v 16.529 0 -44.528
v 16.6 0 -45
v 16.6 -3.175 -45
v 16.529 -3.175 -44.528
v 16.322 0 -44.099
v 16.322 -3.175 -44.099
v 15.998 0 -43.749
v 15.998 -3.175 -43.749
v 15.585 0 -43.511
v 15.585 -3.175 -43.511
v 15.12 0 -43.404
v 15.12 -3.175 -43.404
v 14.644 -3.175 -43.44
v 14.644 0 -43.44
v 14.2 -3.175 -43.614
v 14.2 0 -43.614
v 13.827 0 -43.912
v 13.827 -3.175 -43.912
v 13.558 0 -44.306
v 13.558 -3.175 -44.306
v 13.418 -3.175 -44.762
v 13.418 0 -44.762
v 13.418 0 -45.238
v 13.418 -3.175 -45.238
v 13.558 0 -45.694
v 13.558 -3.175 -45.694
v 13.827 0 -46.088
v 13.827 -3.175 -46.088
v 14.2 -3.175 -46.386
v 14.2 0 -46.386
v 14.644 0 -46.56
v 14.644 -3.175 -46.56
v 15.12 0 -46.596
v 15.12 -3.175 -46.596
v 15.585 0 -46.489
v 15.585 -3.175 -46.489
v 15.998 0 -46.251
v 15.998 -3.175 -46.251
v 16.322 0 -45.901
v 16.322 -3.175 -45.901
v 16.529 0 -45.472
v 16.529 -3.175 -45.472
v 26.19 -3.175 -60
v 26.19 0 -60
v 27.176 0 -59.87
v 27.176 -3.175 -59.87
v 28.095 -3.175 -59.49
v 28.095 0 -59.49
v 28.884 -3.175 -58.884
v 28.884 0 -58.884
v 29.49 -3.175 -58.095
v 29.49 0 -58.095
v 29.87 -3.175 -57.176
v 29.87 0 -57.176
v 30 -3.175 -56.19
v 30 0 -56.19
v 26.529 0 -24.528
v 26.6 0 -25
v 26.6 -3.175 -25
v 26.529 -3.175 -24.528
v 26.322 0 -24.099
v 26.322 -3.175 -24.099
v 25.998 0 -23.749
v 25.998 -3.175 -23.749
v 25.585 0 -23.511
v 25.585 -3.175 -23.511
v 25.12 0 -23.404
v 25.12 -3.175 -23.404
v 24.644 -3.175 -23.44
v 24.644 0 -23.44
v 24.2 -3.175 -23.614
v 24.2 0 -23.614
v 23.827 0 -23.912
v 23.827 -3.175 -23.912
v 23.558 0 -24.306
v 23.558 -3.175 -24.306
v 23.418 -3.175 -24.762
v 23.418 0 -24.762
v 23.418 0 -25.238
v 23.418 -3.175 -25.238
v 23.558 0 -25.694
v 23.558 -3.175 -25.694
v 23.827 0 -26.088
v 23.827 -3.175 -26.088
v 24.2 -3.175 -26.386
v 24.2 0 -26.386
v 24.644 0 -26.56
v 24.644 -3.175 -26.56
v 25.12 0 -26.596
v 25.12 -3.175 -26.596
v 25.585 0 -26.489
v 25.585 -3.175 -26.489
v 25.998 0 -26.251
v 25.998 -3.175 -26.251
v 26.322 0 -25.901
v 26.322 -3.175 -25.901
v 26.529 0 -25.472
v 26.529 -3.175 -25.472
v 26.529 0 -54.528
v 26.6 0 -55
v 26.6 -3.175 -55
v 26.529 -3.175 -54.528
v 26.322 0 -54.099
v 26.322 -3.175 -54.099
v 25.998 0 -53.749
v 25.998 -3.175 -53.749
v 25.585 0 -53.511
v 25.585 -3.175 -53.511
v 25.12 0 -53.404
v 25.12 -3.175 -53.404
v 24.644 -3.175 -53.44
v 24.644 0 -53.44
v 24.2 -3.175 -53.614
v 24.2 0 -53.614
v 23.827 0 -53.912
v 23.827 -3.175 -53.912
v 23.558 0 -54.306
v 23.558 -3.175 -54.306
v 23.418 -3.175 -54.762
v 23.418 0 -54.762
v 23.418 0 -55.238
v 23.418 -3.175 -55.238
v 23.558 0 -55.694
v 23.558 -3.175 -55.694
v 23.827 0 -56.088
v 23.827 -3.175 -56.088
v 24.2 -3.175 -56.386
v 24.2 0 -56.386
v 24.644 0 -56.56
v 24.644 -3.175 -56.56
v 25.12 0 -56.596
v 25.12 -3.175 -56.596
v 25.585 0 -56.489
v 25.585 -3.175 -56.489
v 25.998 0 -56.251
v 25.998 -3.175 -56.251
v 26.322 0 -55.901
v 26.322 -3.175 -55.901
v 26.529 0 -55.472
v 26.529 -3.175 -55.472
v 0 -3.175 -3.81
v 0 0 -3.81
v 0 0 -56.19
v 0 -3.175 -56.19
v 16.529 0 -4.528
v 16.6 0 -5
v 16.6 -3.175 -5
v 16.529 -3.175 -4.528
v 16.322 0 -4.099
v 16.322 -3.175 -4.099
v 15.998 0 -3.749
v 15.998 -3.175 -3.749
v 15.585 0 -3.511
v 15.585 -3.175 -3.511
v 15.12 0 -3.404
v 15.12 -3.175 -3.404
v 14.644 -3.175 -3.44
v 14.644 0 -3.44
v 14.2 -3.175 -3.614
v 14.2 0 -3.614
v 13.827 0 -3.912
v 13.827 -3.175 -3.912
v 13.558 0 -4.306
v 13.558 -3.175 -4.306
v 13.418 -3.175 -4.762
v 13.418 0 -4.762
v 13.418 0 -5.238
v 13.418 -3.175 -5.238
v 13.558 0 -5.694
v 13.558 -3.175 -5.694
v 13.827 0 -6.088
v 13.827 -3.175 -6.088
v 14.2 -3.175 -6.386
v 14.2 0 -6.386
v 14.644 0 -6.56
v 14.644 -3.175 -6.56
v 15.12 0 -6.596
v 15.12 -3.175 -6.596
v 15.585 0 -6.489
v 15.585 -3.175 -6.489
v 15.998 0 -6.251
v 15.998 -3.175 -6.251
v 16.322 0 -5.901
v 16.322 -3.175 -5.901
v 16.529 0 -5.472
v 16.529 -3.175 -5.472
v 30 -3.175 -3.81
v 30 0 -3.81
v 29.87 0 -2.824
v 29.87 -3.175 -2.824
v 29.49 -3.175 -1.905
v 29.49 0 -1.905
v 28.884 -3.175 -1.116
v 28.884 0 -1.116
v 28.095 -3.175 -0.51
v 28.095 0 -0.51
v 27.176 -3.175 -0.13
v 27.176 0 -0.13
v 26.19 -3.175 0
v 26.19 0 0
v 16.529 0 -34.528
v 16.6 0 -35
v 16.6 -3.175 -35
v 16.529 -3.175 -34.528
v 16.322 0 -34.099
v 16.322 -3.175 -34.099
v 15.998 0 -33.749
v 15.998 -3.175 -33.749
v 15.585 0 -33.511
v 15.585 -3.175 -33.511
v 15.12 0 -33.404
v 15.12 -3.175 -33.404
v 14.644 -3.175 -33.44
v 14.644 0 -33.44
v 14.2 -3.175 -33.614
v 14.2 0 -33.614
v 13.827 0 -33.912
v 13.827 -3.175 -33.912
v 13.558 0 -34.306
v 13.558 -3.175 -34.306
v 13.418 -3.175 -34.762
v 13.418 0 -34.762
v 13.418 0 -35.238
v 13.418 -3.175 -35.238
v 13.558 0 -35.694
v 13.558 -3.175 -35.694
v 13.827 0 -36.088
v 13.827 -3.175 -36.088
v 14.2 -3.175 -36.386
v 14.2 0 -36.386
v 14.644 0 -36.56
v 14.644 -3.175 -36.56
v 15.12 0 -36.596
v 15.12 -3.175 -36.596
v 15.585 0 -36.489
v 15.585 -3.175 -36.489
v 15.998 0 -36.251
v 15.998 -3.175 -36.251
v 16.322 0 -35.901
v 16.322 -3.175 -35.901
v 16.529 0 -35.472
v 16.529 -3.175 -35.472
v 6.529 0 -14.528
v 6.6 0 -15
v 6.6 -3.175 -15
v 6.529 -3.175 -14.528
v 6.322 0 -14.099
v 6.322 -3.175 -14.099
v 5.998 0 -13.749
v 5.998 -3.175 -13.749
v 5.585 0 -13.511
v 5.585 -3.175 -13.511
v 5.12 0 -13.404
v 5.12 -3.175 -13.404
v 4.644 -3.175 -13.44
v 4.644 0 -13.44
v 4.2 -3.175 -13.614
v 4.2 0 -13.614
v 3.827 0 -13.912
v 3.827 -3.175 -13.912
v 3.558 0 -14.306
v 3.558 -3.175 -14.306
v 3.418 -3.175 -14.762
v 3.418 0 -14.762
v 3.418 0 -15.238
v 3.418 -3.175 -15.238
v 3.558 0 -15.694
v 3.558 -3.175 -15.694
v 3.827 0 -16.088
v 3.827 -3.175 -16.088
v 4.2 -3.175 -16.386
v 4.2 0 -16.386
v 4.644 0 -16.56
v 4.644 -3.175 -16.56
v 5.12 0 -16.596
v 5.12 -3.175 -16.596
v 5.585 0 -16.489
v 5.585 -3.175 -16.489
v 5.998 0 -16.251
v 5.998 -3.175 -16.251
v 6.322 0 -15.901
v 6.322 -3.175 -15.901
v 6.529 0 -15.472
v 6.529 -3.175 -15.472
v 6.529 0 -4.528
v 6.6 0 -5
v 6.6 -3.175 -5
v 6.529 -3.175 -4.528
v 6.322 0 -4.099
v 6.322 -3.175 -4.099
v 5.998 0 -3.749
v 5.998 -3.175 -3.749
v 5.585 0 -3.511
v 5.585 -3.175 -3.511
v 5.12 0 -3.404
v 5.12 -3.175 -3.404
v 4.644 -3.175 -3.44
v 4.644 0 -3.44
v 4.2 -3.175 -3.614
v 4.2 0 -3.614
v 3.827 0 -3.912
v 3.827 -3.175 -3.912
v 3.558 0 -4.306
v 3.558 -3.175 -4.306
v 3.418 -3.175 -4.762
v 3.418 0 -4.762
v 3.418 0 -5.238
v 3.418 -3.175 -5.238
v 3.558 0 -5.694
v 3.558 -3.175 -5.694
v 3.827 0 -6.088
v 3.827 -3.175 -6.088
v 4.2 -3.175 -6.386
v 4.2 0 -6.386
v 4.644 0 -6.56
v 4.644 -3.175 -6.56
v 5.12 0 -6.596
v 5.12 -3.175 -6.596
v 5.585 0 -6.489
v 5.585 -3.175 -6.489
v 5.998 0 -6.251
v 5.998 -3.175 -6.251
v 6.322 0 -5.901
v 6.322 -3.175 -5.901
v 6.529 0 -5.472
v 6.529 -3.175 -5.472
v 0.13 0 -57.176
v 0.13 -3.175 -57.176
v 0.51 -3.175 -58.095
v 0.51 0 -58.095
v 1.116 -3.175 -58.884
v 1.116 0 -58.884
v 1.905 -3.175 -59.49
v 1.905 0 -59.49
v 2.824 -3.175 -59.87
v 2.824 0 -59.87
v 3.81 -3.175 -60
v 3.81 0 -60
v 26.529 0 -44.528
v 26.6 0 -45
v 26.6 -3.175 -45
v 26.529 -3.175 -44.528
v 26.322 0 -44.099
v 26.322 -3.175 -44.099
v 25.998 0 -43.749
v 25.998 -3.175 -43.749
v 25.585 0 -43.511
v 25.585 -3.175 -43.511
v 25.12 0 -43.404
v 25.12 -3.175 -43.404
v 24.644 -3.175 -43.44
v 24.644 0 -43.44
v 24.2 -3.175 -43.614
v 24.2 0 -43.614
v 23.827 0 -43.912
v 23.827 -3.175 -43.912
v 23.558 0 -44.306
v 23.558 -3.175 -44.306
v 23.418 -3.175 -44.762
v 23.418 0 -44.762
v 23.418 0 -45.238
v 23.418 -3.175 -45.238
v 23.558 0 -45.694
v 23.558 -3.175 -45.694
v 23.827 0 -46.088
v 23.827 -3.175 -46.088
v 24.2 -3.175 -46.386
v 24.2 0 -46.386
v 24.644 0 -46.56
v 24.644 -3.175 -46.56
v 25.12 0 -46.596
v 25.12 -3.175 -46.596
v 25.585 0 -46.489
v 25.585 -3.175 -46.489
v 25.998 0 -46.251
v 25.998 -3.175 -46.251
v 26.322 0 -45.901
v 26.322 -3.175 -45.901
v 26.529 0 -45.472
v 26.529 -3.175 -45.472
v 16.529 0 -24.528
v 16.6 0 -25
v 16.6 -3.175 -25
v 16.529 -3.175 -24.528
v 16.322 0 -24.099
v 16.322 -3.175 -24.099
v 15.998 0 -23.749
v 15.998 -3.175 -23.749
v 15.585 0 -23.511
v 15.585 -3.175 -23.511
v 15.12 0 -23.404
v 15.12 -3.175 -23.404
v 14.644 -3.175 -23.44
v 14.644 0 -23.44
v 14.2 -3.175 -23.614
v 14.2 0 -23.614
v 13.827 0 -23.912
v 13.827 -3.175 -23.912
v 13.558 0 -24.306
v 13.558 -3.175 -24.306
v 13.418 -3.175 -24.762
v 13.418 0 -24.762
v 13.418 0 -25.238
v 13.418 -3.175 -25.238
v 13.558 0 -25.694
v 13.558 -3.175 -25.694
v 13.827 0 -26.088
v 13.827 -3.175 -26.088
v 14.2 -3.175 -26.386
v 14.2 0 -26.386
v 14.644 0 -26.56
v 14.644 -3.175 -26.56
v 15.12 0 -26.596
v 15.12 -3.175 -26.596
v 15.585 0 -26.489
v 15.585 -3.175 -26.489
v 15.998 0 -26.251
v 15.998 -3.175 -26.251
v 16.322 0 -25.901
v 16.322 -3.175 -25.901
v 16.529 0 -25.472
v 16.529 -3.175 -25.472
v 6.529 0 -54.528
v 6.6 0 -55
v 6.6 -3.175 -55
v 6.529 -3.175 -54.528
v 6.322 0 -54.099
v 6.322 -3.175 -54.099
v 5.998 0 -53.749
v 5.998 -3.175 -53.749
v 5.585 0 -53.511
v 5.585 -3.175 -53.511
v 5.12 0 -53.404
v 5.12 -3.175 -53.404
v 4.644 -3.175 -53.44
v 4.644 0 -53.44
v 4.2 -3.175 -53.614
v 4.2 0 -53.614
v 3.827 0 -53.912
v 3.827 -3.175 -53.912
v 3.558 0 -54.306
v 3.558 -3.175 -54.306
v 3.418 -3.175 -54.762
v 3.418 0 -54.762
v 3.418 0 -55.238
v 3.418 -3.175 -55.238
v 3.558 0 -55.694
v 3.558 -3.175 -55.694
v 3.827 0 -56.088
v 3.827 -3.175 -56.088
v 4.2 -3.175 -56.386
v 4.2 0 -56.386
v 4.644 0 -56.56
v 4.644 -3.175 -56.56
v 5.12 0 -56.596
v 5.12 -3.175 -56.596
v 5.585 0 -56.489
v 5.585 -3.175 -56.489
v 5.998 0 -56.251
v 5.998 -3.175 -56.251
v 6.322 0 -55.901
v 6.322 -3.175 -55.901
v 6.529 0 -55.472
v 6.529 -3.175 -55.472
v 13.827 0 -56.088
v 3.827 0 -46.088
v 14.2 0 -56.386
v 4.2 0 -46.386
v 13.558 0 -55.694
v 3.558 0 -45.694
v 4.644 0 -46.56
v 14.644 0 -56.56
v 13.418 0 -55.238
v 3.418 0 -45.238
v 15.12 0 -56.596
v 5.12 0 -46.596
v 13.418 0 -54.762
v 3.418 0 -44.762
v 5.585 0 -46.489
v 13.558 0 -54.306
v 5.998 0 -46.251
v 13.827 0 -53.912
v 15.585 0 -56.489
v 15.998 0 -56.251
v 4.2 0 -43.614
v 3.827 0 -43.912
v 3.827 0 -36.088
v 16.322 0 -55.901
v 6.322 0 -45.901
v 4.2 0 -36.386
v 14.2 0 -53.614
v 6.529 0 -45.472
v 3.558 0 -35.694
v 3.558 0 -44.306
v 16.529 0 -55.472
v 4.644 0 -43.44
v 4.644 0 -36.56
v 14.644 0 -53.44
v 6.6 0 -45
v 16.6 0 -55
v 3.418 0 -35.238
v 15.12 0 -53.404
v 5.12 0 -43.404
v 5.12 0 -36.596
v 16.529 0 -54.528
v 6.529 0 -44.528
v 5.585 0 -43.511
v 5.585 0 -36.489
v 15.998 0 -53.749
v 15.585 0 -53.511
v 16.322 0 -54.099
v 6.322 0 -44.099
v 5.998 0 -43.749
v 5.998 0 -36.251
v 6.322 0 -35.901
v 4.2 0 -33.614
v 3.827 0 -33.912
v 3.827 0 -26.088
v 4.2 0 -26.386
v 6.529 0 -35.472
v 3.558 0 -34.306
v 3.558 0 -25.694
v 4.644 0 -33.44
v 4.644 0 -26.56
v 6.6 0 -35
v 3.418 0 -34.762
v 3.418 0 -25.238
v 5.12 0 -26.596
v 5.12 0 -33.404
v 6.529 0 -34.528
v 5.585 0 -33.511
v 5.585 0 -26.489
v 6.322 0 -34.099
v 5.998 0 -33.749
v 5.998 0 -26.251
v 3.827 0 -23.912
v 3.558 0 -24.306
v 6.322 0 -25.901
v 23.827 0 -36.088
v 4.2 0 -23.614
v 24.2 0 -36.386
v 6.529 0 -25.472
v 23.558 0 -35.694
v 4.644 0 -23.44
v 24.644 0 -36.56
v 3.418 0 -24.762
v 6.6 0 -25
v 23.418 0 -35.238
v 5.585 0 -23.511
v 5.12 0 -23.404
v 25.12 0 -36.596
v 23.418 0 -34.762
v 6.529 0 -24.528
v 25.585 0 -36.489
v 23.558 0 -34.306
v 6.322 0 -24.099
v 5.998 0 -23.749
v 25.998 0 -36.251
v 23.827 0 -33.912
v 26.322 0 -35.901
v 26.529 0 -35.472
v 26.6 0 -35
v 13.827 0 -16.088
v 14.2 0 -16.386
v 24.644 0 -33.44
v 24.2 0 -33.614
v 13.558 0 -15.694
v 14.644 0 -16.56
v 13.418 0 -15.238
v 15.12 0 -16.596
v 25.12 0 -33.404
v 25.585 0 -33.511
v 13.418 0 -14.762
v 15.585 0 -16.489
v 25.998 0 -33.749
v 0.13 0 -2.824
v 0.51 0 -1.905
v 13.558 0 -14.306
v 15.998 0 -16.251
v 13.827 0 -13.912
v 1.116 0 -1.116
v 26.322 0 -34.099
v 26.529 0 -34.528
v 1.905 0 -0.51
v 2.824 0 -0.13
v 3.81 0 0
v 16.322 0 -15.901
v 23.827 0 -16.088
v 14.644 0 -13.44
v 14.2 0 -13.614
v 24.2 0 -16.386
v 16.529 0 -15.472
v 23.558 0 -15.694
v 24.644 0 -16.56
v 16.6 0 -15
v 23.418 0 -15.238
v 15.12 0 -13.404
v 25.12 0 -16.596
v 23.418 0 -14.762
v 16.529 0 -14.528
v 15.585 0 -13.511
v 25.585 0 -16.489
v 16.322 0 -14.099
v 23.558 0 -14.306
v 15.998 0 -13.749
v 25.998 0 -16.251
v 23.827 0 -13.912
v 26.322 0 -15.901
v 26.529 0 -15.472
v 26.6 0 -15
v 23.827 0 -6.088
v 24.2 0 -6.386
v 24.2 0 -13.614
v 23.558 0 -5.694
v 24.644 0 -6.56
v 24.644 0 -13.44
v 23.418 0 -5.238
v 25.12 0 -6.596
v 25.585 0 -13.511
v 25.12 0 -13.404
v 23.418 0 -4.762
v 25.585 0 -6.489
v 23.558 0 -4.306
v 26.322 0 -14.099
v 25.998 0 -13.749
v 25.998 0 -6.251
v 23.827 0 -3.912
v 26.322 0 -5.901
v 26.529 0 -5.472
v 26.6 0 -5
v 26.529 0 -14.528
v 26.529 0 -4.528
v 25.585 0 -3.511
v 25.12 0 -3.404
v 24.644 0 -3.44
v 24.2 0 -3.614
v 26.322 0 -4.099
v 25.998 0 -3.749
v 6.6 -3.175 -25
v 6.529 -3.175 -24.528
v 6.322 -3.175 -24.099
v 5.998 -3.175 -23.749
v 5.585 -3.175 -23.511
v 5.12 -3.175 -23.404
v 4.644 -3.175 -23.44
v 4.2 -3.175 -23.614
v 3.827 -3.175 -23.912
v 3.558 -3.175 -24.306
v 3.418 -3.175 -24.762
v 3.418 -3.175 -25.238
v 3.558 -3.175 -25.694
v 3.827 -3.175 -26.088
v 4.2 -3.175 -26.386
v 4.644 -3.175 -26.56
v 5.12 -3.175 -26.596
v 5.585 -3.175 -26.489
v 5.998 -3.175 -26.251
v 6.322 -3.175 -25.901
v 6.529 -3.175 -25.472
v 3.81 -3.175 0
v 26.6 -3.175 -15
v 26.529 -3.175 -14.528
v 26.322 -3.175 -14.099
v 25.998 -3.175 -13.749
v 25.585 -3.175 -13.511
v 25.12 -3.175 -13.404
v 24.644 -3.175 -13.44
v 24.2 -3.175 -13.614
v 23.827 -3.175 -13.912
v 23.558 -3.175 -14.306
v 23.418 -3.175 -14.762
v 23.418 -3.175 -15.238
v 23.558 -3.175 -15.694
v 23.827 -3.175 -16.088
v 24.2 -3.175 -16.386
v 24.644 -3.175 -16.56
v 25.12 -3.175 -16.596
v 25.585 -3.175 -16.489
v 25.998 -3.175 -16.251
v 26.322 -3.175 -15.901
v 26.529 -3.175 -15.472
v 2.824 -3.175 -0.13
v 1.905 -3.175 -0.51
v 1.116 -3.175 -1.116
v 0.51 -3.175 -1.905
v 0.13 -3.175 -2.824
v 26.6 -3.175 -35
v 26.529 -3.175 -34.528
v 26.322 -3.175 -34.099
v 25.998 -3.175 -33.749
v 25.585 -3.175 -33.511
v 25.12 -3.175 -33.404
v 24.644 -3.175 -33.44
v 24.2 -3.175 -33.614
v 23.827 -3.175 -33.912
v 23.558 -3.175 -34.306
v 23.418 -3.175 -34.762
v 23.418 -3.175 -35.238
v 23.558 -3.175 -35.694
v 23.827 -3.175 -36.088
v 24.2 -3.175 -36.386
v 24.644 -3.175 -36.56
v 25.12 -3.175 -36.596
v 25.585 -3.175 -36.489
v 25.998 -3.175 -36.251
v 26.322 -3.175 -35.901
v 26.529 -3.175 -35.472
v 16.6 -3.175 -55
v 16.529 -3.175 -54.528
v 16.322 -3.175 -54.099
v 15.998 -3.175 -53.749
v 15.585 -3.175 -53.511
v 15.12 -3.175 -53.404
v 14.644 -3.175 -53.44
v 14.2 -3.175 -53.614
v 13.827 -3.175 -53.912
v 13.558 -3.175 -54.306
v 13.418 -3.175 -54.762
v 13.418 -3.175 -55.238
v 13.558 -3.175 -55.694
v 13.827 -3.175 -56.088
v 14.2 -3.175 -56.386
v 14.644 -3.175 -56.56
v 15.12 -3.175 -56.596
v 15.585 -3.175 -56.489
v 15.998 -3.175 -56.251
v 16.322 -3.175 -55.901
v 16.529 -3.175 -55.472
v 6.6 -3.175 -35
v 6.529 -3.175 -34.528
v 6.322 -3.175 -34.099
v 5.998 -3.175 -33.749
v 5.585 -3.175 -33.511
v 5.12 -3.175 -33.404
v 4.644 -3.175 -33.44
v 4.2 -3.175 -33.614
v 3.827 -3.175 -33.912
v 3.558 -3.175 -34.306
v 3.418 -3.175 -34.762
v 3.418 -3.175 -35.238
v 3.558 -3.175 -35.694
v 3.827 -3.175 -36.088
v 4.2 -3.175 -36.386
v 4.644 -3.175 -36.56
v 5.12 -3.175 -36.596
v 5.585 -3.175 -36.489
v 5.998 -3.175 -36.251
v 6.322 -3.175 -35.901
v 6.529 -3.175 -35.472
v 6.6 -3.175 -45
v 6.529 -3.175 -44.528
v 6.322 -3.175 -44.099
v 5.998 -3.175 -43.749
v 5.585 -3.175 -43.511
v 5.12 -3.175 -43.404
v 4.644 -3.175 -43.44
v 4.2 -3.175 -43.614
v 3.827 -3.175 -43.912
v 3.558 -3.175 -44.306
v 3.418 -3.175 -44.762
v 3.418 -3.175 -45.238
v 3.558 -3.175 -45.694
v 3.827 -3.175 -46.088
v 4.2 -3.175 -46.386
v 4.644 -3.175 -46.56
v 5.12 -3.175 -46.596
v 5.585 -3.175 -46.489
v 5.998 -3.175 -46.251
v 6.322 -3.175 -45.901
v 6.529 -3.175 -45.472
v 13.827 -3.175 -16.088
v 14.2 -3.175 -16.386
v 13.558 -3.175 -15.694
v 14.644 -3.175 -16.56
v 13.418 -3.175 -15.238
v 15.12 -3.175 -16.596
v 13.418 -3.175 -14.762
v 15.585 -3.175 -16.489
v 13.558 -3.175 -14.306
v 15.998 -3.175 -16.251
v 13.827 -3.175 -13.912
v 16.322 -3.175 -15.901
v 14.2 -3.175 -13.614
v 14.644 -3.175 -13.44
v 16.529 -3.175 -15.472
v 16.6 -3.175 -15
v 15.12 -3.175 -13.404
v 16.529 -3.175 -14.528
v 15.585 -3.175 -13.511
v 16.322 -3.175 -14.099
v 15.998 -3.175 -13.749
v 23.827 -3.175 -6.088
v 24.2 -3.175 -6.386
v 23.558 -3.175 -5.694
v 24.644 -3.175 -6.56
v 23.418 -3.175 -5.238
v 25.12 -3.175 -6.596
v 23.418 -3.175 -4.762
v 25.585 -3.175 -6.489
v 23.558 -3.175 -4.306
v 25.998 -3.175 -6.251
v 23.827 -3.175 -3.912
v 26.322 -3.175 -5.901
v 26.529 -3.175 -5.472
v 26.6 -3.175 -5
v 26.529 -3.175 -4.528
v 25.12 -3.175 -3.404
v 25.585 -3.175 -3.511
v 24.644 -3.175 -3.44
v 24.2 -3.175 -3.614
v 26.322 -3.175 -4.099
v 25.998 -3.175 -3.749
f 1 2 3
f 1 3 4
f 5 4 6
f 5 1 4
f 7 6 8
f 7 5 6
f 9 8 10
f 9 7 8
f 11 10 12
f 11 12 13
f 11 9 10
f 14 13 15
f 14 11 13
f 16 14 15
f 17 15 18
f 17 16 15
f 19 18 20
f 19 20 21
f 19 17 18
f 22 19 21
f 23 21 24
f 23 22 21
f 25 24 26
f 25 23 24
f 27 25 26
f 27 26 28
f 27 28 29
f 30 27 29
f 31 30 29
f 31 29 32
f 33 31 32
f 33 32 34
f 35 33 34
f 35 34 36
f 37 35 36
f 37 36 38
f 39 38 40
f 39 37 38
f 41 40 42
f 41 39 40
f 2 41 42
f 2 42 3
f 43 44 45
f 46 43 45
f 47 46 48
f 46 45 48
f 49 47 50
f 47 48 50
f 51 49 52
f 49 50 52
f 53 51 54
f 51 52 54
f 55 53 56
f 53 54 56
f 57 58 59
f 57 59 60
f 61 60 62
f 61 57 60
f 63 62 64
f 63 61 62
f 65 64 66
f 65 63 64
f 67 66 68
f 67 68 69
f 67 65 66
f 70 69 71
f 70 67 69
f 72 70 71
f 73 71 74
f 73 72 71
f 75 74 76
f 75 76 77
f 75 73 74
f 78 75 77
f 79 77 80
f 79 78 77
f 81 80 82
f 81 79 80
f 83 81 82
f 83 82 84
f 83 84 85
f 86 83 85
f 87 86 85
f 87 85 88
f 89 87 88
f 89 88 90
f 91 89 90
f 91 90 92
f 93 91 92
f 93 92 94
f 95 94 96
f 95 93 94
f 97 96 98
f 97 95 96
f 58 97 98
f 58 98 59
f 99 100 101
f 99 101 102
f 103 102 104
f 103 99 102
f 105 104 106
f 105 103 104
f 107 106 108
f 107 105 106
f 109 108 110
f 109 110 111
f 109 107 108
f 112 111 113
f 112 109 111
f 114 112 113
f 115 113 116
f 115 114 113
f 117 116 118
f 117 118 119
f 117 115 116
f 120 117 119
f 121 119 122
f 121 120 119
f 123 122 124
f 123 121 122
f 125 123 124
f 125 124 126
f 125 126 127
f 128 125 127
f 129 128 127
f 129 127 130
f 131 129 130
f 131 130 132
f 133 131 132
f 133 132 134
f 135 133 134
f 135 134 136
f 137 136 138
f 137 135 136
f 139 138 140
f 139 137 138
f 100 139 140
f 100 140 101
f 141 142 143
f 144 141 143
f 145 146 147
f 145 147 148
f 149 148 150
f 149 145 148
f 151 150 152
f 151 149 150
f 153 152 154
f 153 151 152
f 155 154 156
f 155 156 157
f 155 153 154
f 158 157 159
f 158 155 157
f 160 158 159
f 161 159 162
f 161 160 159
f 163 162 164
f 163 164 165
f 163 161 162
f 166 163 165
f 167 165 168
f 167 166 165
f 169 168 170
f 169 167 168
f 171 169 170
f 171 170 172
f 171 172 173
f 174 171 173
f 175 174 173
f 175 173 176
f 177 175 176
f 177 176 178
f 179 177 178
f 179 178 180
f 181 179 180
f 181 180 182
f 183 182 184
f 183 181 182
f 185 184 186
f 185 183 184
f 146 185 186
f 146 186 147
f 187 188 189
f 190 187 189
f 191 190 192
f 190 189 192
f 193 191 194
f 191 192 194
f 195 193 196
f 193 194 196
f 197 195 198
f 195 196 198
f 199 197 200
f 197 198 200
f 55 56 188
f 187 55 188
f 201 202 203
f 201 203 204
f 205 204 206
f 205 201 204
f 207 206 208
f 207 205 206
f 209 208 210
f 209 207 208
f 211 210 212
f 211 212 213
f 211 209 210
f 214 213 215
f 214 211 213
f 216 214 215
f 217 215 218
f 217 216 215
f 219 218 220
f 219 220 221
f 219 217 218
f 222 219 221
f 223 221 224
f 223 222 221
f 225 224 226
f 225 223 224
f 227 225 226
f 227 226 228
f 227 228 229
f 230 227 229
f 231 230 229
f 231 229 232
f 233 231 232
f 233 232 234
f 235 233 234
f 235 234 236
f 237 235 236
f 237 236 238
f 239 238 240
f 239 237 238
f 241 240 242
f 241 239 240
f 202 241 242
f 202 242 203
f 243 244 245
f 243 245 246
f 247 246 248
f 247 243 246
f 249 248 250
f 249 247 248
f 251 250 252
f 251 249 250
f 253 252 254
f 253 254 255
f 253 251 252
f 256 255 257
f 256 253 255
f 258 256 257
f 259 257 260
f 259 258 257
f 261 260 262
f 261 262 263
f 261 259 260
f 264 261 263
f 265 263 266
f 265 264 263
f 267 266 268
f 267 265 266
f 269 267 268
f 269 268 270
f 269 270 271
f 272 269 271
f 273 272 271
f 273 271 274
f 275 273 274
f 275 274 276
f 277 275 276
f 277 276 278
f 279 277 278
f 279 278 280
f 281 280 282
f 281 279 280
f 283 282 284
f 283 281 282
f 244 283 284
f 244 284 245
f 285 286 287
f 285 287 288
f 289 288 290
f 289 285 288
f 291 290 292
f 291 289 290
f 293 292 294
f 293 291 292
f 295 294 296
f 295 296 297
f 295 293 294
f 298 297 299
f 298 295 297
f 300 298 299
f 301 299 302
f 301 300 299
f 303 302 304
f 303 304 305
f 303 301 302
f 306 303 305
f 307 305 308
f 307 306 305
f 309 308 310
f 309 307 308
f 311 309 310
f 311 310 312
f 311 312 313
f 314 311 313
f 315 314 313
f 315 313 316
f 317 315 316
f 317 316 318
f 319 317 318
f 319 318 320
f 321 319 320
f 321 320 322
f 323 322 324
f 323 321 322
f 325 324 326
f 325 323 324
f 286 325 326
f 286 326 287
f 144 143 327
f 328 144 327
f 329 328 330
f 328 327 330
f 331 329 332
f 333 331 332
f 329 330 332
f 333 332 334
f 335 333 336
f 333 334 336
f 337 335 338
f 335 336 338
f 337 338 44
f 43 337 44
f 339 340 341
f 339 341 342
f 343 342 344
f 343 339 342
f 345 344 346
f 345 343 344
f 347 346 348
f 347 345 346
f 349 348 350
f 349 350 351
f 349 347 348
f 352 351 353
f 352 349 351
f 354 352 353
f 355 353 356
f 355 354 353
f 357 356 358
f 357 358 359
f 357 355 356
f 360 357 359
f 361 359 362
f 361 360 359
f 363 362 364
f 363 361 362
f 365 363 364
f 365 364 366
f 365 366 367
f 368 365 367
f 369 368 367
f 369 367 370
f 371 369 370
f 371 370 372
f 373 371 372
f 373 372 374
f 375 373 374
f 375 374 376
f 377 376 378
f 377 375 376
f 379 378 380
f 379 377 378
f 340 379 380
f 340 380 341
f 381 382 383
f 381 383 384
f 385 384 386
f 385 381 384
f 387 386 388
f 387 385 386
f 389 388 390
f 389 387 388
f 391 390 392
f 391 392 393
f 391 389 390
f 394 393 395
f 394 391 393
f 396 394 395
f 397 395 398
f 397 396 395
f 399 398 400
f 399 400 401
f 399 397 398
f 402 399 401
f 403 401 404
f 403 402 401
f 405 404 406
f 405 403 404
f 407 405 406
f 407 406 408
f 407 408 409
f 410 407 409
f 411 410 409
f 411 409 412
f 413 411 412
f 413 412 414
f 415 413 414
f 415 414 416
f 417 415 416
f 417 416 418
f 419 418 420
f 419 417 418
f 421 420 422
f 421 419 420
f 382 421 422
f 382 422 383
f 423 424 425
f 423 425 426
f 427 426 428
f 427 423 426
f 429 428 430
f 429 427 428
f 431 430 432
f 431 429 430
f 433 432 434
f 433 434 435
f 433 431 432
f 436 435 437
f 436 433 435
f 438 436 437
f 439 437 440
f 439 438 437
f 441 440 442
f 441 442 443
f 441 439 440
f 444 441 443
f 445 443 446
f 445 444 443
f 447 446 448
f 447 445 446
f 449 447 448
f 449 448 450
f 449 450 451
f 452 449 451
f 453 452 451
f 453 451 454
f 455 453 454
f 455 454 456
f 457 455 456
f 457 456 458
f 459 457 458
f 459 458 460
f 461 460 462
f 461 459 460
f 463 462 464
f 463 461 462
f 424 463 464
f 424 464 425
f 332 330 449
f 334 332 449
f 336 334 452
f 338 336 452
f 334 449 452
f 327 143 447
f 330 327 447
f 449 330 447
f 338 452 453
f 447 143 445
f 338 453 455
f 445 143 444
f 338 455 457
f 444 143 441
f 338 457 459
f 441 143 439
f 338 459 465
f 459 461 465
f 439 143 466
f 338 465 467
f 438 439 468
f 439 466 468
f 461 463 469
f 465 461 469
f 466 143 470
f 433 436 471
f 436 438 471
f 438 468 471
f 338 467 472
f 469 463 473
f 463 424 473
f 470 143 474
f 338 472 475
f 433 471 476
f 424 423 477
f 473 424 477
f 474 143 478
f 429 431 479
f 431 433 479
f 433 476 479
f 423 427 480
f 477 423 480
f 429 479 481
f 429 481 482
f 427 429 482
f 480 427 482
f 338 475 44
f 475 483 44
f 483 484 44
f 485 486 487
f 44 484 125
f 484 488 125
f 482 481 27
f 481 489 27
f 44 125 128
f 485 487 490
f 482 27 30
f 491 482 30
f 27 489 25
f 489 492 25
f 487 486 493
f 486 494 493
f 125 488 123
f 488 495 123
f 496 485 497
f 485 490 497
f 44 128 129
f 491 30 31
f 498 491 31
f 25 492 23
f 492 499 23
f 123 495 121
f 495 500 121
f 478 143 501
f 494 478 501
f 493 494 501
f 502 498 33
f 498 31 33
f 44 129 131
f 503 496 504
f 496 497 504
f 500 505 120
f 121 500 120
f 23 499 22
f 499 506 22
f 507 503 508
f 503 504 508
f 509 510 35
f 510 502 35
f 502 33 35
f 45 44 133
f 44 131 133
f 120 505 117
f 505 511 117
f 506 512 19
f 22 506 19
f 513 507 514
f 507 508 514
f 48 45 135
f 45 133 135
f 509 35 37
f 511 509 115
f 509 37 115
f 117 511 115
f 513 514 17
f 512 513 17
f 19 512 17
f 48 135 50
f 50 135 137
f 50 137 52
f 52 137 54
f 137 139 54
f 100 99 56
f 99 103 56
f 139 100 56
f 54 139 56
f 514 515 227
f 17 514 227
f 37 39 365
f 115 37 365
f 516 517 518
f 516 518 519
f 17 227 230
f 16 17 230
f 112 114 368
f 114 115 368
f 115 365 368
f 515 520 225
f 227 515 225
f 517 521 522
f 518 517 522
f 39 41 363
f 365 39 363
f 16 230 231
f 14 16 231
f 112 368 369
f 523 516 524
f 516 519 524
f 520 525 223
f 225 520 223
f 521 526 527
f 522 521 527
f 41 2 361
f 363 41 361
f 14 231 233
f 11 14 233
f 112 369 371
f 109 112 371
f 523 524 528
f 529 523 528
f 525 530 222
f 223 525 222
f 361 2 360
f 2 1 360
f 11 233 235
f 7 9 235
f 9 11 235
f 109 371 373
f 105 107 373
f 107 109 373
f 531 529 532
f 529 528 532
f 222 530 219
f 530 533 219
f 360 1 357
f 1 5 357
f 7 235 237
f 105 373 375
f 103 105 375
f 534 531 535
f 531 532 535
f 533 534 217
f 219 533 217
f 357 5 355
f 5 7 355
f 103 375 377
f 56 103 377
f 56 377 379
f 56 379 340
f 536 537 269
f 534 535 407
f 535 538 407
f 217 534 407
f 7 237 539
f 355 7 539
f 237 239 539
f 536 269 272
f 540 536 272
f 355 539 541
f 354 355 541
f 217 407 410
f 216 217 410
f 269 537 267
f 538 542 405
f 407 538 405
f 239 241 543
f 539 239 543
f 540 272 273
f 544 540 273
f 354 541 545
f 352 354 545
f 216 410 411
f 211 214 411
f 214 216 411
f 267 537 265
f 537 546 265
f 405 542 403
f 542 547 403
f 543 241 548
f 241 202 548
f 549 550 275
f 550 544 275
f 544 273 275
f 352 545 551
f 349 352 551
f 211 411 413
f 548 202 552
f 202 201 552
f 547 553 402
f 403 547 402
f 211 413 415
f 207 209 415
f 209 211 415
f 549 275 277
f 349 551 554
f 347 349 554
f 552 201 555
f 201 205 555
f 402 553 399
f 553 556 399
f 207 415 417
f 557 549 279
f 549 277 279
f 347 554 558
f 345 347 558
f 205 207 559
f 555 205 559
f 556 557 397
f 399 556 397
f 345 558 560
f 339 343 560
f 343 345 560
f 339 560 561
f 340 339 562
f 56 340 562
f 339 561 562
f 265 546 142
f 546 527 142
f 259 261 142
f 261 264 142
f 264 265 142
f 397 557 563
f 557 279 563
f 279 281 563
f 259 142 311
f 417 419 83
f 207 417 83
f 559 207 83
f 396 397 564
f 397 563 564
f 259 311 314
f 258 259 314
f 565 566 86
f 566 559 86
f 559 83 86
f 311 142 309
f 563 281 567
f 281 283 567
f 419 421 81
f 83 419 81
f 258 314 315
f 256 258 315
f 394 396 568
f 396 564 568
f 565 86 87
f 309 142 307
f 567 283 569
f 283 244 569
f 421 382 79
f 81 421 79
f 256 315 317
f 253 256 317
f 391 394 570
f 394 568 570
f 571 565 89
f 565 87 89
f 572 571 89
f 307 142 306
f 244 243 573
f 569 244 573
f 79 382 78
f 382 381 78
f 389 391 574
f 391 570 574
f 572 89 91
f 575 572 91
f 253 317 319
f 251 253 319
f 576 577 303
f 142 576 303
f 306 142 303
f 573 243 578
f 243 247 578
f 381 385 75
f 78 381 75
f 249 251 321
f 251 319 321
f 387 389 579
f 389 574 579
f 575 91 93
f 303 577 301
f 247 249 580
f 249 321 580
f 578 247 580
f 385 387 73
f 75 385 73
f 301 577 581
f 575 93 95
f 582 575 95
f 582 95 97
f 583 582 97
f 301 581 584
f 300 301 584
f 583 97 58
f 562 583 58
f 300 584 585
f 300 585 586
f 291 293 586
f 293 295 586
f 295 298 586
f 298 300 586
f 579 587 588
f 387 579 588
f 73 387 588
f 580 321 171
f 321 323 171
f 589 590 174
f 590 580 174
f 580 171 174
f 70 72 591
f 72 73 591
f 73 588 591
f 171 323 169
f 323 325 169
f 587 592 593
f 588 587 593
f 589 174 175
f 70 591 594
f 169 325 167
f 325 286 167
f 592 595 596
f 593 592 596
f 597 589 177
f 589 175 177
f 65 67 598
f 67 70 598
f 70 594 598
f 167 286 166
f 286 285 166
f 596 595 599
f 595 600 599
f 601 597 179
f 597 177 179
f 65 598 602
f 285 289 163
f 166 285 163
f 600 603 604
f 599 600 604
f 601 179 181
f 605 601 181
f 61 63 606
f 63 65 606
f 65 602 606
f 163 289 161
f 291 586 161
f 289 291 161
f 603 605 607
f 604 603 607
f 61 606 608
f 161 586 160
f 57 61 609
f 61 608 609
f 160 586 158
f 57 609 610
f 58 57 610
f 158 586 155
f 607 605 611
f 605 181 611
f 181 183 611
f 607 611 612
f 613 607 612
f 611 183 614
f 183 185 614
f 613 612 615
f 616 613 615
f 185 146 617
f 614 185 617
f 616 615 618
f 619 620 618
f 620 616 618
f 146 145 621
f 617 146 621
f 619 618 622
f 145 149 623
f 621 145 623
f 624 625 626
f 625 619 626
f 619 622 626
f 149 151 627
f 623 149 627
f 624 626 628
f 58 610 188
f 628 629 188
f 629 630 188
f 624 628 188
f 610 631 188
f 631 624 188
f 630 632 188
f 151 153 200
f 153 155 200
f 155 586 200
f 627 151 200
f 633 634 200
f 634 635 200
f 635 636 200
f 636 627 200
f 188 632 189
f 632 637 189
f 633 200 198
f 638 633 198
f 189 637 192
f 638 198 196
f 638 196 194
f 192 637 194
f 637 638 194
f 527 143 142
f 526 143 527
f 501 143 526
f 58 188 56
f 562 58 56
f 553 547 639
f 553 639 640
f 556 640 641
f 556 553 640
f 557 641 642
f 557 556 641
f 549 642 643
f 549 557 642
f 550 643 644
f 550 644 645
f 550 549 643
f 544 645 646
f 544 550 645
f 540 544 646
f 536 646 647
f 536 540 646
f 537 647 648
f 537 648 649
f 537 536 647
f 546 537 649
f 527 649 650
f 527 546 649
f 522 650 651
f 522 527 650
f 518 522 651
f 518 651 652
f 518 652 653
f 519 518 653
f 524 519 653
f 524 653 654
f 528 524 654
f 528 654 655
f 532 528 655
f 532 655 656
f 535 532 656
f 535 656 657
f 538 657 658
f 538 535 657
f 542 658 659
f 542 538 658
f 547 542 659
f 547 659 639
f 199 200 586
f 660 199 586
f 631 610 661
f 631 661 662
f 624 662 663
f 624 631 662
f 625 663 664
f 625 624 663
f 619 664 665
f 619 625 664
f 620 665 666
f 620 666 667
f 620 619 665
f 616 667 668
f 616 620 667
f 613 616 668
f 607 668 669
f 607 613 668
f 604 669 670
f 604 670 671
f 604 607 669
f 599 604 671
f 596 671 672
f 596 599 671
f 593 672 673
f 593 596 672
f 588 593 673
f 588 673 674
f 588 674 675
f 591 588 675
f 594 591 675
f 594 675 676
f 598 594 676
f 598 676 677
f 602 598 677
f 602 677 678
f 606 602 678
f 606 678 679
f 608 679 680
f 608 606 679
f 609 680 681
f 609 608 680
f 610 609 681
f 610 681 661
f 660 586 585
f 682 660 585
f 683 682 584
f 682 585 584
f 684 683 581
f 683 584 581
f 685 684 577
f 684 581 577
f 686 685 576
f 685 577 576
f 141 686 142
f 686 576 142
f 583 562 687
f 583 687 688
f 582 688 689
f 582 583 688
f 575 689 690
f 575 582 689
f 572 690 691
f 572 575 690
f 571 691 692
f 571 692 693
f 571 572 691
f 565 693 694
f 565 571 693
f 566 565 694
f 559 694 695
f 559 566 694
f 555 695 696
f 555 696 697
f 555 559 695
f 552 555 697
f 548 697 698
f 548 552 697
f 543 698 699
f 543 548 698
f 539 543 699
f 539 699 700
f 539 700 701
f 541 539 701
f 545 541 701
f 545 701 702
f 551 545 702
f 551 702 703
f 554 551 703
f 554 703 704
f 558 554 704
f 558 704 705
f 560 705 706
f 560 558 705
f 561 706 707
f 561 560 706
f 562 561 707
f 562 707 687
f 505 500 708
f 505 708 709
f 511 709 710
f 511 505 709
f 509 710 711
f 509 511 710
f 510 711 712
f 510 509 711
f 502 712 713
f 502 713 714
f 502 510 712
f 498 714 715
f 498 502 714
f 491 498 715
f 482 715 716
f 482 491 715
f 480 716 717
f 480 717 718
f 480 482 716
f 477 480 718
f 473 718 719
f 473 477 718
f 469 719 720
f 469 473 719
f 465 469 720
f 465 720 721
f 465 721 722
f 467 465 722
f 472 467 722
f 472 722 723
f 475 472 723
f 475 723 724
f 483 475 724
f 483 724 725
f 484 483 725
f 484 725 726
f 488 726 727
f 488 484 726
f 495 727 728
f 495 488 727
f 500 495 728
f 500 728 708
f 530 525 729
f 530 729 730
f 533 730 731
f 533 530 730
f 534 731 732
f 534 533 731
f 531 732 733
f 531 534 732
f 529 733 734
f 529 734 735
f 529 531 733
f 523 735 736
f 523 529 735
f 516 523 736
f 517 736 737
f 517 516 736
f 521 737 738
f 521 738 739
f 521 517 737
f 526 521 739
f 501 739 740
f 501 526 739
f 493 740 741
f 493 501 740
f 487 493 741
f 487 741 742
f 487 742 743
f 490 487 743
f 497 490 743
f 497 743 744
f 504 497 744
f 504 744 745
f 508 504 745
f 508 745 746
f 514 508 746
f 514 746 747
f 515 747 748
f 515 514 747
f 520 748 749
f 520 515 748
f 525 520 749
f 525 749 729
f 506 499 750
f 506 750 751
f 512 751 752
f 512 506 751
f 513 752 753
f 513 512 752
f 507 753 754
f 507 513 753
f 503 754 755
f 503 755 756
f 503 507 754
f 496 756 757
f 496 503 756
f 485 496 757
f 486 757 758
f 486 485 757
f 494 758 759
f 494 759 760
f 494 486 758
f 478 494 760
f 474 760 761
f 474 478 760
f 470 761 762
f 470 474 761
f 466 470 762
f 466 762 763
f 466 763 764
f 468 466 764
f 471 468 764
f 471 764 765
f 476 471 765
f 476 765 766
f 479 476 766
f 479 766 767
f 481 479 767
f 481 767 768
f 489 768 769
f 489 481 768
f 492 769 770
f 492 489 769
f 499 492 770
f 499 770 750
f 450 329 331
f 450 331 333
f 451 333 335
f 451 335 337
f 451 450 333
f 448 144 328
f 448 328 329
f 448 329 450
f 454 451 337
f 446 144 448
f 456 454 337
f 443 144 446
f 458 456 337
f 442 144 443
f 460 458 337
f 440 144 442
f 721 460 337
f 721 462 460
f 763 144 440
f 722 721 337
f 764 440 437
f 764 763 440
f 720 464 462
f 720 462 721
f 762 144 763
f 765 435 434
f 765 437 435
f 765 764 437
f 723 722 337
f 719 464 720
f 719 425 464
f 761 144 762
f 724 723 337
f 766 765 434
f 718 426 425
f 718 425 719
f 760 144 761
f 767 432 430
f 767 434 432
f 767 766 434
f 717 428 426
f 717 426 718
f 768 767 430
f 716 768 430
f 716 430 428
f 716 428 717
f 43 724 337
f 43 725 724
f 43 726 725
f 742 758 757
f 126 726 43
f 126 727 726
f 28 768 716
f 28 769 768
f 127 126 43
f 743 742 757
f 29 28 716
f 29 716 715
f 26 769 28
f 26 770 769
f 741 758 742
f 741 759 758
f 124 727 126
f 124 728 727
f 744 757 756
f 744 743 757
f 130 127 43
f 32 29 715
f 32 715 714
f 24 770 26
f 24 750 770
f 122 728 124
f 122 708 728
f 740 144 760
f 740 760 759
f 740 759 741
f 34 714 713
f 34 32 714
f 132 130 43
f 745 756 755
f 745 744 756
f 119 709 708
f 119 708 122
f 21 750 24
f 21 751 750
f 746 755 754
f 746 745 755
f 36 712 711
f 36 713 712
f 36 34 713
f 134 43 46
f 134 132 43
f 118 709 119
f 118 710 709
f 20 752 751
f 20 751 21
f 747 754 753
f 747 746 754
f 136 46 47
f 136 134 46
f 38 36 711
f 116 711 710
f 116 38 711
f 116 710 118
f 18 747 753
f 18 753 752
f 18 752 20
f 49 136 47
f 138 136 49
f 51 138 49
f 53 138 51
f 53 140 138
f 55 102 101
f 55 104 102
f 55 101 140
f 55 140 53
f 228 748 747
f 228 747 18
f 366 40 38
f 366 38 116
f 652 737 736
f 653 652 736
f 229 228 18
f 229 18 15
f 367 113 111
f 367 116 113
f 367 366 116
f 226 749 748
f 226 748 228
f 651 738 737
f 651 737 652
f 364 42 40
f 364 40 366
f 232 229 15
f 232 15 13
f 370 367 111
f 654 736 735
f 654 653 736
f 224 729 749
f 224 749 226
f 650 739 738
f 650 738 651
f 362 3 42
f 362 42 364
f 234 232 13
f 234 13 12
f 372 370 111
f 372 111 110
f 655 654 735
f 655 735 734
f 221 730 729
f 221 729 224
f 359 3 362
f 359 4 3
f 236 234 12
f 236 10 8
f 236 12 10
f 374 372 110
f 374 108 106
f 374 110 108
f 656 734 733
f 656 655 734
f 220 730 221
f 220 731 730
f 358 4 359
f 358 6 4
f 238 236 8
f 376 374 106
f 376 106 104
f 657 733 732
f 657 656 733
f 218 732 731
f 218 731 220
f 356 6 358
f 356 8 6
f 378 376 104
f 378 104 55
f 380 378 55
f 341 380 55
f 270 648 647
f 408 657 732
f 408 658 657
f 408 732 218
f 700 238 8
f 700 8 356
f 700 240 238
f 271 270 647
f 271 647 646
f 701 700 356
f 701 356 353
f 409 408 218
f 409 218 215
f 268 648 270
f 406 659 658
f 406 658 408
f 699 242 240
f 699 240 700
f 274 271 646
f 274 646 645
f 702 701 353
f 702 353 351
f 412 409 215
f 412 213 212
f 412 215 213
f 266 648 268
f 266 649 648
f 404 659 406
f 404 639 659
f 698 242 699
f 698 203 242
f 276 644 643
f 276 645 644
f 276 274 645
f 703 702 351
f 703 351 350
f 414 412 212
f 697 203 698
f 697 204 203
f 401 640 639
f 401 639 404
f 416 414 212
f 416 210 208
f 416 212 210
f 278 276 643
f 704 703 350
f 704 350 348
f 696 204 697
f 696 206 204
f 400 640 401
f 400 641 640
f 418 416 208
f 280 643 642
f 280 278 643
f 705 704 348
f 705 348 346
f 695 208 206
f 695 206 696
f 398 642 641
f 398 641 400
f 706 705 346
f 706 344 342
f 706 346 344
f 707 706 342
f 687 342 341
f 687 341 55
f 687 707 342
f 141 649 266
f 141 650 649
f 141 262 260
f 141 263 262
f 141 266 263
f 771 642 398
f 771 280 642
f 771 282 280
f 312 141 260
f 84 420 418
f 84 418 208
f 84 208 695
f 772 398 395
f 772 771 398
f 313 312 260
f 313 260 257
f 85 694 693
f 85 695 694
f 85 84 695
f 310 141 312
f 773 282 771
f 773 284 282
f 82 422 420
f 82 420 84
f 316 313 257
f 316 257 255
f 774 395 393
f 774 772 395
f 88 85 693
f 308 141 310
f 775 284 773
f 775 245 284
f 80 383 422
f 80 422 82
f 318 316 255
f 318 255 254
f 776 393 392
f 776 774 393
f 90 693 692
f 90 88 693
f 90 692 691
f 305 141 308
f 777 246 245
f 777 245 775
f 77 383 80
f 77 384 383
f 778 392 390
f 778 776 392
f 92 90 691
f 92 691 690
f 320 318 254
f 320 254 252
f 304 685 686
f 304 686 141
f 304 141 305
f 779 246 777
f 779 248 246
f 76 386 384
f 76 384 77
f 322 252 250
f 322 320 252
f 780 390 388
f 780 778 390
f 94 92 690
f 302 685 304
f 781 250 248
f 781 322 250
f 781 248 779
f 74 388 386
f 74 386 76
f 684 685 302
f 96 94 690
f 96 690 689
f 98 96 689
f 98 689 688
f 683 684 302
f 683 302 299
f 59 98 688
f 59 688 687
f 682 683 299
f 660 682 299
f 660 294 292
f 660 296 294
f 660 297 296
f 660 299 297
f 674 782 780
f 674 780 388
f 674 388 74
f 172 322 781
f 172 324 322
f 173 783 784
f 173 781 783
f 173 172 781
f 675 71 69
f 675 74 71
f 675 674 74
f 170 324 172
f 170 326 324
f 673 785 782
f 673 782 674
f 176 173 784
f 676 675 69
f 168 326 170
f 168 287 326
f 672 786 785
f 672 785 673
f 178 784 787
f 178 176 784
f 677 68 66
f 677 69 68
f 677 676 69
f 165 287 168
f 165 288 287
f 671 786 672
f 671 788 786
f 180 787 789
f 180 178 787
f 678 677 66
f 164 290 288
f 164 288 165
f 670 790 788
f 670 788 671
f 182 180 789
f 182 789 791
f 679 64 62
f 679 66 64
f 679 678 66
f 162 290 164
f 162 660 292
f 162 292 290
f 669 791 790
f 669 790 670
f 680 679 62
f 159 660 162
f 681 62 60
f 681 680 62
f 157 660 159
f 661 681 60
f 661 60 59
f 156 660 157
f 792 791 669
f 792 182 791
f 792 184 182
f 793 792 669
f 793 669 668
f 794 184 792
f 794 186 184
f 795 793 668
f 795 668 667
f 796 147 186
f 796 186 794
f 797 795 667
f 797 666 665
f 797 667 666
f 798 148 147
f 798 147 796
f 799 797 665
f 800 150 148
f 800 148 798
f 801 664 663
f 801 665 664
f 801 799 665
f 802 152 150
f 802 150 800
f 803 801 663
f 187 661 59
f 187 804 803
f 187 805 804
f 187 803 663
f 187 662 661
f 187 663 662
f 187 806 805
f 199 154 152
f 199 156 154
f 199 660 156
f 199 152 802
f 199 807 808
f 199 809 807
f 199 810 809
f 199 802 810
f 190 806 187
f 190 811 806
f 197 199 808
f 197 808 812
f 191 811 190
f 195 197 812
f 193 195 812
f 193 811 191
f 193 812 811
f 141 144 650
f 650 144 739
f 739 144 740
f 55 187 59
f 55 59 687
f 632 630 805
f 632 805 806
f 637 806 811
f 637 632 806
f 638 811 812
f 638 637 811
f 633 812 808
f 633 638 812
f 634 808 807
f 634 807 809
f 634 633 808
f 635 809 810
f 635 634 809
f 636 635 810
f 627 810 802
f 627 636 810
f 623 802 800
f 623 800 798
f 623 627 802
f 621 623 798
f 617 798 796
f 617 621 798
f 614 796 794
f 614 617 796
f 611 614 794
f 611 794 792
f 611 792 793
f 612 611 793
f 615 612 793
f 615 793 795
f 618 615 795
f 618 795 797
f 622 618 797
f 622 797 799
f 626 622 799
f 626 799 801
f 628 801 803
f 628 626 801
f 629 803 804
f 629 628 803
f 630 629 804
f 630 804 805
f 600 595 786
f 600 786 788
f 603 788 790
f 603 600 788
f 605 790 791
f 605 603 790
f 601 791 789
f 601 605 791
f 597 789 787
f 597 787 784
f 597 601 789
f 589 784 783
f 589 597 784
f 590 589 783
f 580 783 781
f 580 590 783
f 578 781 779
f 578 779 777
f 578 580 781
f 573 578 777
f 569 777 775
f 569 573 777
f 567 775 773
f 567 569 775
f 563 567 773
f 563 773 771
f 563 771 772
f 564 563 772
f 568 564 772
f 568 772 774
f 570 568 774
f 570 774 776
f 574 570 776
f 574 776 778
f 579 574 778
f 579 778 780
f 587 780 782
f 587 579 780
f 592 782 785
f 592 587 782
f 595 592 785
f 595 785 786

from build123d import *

# Parameters (mm, degrees)
F0_R     = 1.6
F1_DEPTH = 3.175


with BuildPart() as f1:
    # F0 (on Front) → F1 (new body)
    with BuildSketch(Plane.XZ):
        with BuildLine():
            Line((26.19, 0), (3.81, 0))
            ThreePointArc((3.81, 0), (1.115923, -1.115923), (0, -3.81))
            Line((0, -3.81), (0, -56.19))
            ThreePointArc((0, -56.19), (1.115923, -58.884077), (3.81, -60))
            Line((3.81, -60), (26.19, -60))
            ThreePointArc((26.19, -60), (28.884077, -58.884077), (30, -56.19))
            Line((30, -56.19), (30, -3.81))
            ThreePointArc((30, -3.81), (28.884077, -1.115923), (26.19, 0))
        make_face()
        with Locations((5, -55)):
            Circle(F0_R, mode=Mode.SUBTRACT)
        with Locations((5, -45)):
            Circle(F0_R, mode=Mode.SUBTRACT)
        with Locations((5, -35)):
            Circle(F0_R, mode=Mode.SUBTRACT)
        with Locations((15, -55)):
            Circle(F0_R, mode=Mode.SUBTRACT)
        with Locations((25, -55)):
            Circle(F0_R, mode=Mode.SUBTRACT)
        with Locations((15, -45)):
            Circle(F0_R, mode=Mode.SUBTRACT)
        with Locations((15, -35)):
            Circle(F0_R, mode=Mode.SUBTRACT)
        with Locations((25, -45)):
            Circle(F0_R, mode=Mode.SUBTRACT)
        with Locations((25, -35)):
            Circle(F0_R, mode=Mode.SUBTRACT)
        with Locations((5, -25)):
            Circle(F0_R, mode=Mode.SUBTRACT)
        with Locations((5, -15)):
            Circle(F0_R, mode=Mode.SUBTRACT)
        with Locations((5, -5)):
            Circle(F0_R, mode=Mode.SUBTRACT)
        with Locations((15, -25)):
            Circle(F0_R, mode=Mode.SUBTRACT)
        with Locations((25, -25)):
            Circle(F0_R, mode=Mode.SUBTRACT)
        with Locations((15, -15)):
            Circle(F0_R, mode=Mode.SUBTRACT)
        with Locations((15, -5)):
            Circle(F0_R, mode=Mode.SUBTRACT)
        with Locations((25, -15)):
            Circle(F0_R, mode=Mode.SUBTRACT)
        with Locations((25, -5)):
            Circle(F0_R, mode=Mode.SUBTRACT)
    extrude(amount=F1_DEPTH)


solid = f1.part
